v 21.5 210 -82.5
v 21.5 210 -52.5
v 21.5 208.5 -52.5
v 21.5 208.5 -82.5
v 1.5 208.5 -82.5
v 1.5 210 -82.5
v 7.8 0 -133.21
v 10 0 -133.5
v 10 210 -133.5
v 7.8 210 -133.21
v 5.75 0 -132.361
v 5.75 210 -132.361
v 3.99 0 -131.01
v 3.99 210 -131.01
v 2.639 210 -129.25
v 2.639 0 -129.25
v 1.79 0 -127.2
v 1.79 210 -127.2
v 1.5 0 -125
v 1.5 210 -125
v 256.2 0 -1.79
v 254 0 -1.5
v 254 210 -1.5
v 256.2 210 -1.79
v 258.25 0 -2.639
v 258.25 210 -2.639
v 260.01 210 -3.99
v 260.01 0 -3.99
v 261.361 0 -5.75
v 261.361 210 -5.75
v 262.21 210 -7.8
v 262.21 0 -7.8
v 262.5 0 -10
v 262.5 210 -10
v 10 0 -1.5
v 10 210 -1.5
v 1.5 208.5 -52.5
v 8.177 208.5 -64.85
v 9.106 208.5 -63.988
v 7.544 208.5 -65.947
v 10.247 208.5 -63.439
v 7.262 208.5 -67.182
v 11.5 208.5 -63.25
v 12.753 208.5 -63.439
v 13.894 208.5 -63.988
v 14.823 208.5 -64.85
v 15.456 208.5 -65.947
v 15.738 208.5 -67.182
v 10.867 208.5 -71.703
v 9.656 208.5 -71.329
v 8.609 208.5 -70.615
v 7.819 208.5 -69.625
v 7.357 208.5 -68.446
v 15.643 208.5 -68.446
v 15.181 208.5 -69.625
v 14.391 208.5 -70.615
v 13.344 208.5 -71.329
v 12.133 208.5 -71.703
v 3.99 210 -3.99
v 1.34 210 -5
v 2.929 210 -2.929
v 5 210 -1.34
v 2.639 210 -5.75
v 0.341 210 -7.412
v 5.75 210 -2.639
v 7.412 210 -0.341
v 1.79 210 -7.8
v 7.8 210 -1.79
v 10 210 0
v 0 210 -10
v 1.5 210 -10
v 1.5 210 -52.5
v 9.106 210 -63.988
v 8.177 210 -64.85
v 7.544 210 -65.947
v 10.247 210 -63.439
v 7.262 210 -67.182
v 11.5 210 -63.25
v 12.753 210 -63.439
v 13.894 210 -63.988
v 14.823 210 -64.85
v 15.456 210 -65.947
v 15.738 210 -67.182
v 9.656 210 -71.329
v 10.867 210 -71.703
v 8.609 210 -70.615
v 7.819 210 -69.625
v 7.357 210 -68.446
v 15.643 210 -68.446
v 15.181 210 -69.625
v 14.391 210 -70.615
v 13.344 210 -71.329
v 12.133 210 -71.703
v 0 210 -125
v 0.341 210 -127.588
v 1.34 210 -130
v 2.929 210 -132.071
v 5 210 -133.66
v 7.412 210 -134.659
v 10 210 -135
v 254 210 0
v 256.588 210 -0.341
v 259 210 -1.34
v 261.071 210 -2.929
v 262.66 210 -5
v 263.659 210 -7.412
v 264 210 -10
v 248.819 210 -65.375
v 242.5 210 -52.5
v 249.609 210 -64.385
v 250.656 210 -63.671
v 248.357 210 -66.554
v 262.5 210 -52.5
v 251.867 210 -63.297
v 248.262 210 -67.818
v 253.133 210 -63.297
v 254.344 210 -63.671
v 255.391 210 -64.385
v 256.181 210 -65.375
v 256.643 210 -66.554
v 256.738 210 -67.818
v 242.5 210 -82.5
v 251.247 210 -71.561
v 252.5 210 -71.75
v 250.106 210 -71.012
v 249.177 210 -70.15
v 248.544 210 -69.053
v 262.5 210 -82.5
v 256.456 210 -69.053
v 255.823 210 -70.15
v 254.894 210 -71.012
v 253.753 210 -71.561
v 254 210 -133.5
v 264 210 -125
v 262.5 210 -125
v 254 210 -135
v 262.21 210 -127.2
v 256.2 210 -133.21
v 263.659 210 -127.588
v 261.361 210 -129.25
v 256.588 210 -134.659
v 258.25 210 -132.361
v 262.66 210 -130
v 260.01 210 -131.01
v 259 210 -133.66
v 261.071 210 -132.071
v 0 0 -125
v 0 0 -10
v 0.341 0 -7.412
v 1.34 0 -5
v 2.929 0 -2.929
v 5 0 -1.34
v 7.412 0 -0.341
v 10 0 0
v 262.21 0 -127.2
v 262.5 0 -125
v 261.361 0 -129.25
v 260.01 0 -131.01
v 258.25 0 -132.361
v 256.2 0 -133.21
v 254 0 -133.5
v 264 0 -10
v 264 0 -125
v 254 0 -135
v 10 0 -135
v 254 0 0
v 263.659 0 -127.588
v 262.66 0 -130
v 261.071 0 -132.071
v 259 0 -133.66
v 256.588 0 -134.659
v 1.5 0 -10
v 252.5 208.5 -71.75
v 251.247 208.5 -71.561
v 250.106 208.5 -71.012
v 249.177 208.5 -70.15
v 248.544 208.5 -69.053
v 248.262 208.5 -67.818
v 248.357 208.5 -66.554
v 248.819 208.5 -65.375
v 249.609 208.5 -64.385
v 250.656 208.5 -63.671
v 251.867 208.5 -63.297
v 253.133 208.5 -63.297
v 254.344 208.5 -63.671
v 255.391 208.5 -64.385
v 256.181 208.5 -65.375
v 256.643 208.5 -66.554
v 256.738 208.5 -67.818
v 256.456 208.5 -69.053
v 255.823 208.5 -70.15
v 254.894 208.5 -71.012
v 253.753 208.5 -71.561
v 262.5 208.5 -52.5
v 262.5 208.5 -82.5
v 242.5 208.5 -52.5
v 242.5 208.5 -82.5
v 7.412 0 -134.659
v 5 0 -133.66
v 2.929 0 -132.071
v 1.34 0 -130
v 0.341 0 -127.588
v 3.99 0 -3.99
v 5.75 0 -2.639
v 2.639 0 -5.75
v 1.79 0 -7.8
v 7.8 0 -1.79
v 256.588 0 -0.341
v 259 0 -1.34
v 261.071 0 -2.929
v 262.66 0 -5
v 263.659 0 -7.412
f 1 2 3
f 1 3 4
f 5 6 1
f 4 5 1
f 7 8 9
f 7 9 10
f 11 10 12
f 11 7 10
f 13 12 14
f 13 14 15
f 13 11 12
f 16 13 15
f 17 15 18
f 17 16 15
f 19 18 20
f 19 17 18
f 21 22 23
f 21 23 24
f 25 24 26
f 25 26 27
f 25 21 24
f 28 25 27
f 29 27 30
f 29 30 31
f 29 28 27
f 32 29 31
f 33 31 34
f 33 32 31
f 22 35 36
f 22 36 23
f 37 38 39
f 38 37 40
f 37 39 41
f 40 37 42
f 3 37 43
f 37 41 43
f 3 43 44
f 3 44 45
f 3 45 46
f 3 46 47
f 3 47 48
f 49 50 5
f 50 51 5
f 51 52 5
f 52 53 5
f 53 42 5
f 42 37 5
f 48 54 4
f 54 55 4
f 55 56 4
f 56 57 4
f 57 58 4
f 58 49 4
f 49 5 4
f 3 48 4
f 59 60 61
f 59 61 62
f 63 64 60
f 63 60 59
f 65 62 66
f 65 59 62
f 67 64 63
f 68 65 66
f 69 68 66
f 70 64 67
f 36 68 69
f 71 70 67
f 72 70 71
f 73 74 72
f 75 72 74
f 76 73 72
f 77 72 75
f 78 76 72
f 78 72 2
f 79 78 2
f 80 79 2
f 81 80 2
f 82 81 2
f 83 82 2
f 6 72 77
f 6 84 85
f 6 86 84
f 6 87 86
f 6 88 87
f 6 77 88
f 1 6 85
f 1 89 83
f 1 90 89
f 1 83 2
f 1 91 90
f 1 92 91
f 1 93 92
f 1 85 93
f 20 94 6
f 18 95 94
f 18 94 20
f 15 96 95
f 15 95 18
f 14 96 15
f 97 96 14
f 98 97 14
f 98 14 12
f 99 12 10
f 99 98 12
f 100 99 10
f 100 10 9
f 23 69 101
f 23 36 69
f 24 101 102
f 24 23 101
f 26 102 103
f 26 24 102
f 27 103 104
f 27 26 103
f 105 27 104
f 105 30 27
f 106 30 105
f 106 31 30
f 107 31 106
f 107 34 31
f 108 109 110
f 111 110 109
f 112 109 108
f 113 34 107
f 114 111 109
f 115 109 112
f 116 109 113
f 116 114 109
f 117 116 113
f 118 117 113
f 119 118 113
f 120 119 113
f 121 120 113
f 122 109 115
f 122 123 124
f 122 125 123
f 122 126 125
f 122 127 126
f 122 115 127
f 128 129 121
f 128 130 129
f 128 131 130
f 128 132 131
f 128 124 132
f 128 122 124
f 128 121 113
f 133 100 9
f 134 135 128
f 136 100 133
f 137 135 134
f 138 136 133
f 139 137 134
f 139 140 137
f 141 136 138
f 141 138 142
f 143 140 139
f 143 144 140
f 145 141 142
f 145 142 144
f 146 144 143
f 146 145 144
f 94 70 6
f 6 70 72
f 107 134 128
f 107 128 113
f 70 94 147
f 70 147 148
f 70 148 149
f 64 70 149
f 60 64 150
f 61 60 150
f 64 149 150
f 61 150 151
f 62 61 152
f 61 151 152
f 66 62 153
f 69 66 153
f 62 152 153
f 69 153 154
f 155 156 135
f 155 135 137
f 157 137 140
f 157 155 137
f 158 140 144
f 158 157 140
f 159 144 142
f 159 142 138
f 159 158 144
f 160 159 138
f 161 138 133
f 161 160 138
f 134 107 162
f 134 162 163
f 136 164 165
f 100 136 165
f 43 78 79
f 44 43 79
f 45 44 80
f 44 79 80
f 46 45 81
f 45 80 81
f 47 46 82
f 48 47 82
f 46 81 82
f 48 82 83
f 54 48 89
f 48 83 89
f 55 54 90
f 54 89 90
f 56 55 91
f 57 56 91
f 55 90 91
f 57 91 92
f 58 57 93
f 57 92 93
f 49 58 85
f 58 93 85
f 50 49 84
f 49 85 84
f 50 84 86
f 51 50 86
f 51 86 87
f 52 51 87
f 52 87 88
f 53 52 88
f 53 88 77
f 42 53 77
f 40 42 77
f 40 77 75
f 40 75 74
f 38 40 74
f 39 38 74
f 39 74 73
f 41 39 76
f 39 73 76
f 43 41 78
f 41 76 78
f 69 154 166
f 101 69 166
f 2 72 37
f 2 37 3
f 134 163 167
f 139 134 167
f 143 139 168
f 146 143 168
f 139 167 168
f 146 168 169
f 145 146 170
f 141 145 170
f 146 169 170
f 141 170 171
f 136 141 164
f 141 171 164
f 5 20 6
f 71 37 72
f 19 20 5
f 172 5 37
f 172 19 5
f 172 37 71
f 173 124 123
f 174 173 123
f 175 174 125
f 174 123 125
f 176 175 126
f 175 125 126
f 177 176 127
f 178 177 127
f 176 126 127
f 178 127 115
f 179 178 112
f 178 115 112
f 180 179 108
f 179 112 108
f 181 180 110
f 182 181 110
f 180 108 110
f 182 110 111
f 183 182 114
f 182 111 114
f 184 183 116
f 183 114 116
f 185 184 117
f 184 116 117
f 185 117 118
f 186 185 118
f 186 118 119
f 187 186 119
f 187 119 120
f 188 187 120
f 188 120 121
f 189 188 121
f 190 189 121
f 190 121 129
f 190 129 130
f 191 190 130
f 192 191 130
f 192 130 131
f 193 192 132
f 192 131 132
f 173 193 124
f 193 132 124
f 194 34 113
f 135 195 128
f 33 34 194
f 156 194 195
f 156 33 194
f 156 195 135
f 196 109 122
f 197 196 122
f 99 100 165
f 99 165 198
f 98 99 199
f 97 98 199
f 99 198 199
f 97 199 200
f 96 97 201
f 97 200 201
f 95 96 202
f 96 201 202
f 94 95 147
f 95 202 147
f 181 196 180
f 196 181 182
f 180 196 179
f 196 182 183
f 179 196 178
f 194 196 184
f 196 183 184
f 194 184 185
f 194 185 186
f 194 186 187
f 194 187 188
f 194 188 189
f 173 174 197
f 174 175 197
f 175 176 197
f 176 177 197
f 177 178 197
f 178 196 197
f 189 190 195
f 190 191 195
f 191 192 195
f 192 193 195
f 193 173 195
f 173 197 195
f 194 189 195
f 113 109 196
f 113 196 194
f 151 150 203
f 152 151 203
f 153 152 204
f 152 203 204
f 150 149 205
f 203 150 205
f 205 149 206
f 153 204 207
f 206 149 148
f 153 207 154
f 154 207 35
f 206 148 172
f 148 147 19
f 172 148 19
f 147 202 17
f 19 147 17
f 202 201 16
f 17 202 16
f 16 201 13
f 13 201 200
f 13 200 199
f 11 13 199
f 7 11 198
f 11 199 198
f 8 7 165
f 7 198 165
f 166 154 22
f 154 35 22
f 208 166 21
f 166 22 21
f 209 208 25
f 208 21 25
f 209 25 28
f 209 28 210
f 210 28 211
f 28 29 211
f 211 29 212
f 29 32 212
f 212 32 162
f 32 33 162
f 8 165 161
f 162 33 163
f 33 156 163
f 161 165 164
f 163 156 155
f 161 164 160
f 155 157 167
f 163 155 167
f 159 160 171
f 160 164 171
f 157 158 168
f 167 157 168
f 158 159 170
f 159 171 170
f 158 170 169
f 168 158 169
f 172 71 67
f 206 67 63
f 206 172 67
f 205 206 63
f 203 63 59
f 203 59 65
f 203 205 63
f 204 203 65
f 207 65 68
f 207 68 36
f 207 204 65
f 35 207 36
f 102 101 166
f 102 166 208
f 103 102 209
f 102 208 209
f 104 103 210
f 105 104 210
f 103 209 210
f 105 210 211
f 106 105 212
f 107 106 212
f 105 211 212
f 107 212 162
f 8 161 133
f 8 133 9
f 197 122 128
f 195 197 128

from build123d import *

# Parameters (mm, degrees)
ESTRUSIONE_SOTTILE1_DEPTH    = 210
SCHIZZO2_W                   = 20
SCHIZZO2_H                   = 30
SCHIZZO2_R                   = 4.25
ESTRUSIONE_ESTRUSIONE1_DEPTH = 1.5


with BuildPart() as part:
    # Schizzo1 → Estrusione-Sottile1 (new body)
    with BuildSketch(Plane(origin=(0, 0, 0), x_dir=(1, 0, 0), z_dir=(0, 1, 0))):
        with BuildLine():
            Line((0, 125), (0, 10))
            ThreePointArc((0, 10), (2.928932188, 2.928932188), (10, 0))
            Line((10, 0), (254, 0))
            ThreePointArc((254, 0), (261.071067812, 2.928932188), (264, 10))
            Line((264, 10), (264, 125))
            ThreePointArc((264, 125), (261.071067812, 132.071067812), (254, 135))
            Line((254, 135), (10, 135))
            ThreePointArc((10, 135), (2.928932188, 132.071067812), (0, 125))
        make_face()
        with BuildLine():
            Line((1.5, 125), (1.5, 10))
            ThreePointArc((1.5, 10), (3.98959236, 3.98959236), (10, 1.5))
            Line((10, 1.5), (254, 1.5))
            ThreePointArc((254, 1.5), (260.01040764, 3.98959236), (262.5, 10))
            Line((262.5, 10), (262.5, 125))
            ThreePointArc((262.5, 125), (260.01040764, 131.01040764), (254, 133.5))
            Line((254, 133.5), (10, 133.5))
            ThreePointArc((10, 133.5), (3.98959236, 131.01040764), (1.5, 125))
        make_face(mode=Mode.SUBTRACT)
    extrude(amount=ESTRUSIONE_SOTTILE1_DEPTH)

    # Schizzo2 → Estrusione-Estrusione1 (add)
    # profile 1 of 2: a face of its own
    with BuildSketch(Plane(origin=(0, 210, 0), x_dir=(1, 0, 0), z_dir=(0, 1, 0))):
        with Locations((11.5, 67.5)):
            Rectangle(SCHIZZO2_W, SCHIZZO2_H)
        with Locations(Location((11.5, 67.5, 0), (0, 0, 270))):
            Circle(SCHIZZO2_R, mode=Mode.SUBTRACT)
    # profile 2 of 2: a face of its own
    with BuildSketch(Plane(origin=(0, 210, 0), x_dir=(1, 0, 0), z_dir=(0, 1, 0))):
        with Locations((252.5, 67.5)):
            Rectangle(SCHIZZO2_W, SCHIZZO2_H)
        with Locations(Location((252.5, 67.5, 0), (0, 0, 90))):
            Circle(SCHIZZO2_R, mode=Mode.SUBTRACT)
    extrude(amount=-ESTRUSIONE_ESTRUSIONE1_DEPTH)


solid = part.part
